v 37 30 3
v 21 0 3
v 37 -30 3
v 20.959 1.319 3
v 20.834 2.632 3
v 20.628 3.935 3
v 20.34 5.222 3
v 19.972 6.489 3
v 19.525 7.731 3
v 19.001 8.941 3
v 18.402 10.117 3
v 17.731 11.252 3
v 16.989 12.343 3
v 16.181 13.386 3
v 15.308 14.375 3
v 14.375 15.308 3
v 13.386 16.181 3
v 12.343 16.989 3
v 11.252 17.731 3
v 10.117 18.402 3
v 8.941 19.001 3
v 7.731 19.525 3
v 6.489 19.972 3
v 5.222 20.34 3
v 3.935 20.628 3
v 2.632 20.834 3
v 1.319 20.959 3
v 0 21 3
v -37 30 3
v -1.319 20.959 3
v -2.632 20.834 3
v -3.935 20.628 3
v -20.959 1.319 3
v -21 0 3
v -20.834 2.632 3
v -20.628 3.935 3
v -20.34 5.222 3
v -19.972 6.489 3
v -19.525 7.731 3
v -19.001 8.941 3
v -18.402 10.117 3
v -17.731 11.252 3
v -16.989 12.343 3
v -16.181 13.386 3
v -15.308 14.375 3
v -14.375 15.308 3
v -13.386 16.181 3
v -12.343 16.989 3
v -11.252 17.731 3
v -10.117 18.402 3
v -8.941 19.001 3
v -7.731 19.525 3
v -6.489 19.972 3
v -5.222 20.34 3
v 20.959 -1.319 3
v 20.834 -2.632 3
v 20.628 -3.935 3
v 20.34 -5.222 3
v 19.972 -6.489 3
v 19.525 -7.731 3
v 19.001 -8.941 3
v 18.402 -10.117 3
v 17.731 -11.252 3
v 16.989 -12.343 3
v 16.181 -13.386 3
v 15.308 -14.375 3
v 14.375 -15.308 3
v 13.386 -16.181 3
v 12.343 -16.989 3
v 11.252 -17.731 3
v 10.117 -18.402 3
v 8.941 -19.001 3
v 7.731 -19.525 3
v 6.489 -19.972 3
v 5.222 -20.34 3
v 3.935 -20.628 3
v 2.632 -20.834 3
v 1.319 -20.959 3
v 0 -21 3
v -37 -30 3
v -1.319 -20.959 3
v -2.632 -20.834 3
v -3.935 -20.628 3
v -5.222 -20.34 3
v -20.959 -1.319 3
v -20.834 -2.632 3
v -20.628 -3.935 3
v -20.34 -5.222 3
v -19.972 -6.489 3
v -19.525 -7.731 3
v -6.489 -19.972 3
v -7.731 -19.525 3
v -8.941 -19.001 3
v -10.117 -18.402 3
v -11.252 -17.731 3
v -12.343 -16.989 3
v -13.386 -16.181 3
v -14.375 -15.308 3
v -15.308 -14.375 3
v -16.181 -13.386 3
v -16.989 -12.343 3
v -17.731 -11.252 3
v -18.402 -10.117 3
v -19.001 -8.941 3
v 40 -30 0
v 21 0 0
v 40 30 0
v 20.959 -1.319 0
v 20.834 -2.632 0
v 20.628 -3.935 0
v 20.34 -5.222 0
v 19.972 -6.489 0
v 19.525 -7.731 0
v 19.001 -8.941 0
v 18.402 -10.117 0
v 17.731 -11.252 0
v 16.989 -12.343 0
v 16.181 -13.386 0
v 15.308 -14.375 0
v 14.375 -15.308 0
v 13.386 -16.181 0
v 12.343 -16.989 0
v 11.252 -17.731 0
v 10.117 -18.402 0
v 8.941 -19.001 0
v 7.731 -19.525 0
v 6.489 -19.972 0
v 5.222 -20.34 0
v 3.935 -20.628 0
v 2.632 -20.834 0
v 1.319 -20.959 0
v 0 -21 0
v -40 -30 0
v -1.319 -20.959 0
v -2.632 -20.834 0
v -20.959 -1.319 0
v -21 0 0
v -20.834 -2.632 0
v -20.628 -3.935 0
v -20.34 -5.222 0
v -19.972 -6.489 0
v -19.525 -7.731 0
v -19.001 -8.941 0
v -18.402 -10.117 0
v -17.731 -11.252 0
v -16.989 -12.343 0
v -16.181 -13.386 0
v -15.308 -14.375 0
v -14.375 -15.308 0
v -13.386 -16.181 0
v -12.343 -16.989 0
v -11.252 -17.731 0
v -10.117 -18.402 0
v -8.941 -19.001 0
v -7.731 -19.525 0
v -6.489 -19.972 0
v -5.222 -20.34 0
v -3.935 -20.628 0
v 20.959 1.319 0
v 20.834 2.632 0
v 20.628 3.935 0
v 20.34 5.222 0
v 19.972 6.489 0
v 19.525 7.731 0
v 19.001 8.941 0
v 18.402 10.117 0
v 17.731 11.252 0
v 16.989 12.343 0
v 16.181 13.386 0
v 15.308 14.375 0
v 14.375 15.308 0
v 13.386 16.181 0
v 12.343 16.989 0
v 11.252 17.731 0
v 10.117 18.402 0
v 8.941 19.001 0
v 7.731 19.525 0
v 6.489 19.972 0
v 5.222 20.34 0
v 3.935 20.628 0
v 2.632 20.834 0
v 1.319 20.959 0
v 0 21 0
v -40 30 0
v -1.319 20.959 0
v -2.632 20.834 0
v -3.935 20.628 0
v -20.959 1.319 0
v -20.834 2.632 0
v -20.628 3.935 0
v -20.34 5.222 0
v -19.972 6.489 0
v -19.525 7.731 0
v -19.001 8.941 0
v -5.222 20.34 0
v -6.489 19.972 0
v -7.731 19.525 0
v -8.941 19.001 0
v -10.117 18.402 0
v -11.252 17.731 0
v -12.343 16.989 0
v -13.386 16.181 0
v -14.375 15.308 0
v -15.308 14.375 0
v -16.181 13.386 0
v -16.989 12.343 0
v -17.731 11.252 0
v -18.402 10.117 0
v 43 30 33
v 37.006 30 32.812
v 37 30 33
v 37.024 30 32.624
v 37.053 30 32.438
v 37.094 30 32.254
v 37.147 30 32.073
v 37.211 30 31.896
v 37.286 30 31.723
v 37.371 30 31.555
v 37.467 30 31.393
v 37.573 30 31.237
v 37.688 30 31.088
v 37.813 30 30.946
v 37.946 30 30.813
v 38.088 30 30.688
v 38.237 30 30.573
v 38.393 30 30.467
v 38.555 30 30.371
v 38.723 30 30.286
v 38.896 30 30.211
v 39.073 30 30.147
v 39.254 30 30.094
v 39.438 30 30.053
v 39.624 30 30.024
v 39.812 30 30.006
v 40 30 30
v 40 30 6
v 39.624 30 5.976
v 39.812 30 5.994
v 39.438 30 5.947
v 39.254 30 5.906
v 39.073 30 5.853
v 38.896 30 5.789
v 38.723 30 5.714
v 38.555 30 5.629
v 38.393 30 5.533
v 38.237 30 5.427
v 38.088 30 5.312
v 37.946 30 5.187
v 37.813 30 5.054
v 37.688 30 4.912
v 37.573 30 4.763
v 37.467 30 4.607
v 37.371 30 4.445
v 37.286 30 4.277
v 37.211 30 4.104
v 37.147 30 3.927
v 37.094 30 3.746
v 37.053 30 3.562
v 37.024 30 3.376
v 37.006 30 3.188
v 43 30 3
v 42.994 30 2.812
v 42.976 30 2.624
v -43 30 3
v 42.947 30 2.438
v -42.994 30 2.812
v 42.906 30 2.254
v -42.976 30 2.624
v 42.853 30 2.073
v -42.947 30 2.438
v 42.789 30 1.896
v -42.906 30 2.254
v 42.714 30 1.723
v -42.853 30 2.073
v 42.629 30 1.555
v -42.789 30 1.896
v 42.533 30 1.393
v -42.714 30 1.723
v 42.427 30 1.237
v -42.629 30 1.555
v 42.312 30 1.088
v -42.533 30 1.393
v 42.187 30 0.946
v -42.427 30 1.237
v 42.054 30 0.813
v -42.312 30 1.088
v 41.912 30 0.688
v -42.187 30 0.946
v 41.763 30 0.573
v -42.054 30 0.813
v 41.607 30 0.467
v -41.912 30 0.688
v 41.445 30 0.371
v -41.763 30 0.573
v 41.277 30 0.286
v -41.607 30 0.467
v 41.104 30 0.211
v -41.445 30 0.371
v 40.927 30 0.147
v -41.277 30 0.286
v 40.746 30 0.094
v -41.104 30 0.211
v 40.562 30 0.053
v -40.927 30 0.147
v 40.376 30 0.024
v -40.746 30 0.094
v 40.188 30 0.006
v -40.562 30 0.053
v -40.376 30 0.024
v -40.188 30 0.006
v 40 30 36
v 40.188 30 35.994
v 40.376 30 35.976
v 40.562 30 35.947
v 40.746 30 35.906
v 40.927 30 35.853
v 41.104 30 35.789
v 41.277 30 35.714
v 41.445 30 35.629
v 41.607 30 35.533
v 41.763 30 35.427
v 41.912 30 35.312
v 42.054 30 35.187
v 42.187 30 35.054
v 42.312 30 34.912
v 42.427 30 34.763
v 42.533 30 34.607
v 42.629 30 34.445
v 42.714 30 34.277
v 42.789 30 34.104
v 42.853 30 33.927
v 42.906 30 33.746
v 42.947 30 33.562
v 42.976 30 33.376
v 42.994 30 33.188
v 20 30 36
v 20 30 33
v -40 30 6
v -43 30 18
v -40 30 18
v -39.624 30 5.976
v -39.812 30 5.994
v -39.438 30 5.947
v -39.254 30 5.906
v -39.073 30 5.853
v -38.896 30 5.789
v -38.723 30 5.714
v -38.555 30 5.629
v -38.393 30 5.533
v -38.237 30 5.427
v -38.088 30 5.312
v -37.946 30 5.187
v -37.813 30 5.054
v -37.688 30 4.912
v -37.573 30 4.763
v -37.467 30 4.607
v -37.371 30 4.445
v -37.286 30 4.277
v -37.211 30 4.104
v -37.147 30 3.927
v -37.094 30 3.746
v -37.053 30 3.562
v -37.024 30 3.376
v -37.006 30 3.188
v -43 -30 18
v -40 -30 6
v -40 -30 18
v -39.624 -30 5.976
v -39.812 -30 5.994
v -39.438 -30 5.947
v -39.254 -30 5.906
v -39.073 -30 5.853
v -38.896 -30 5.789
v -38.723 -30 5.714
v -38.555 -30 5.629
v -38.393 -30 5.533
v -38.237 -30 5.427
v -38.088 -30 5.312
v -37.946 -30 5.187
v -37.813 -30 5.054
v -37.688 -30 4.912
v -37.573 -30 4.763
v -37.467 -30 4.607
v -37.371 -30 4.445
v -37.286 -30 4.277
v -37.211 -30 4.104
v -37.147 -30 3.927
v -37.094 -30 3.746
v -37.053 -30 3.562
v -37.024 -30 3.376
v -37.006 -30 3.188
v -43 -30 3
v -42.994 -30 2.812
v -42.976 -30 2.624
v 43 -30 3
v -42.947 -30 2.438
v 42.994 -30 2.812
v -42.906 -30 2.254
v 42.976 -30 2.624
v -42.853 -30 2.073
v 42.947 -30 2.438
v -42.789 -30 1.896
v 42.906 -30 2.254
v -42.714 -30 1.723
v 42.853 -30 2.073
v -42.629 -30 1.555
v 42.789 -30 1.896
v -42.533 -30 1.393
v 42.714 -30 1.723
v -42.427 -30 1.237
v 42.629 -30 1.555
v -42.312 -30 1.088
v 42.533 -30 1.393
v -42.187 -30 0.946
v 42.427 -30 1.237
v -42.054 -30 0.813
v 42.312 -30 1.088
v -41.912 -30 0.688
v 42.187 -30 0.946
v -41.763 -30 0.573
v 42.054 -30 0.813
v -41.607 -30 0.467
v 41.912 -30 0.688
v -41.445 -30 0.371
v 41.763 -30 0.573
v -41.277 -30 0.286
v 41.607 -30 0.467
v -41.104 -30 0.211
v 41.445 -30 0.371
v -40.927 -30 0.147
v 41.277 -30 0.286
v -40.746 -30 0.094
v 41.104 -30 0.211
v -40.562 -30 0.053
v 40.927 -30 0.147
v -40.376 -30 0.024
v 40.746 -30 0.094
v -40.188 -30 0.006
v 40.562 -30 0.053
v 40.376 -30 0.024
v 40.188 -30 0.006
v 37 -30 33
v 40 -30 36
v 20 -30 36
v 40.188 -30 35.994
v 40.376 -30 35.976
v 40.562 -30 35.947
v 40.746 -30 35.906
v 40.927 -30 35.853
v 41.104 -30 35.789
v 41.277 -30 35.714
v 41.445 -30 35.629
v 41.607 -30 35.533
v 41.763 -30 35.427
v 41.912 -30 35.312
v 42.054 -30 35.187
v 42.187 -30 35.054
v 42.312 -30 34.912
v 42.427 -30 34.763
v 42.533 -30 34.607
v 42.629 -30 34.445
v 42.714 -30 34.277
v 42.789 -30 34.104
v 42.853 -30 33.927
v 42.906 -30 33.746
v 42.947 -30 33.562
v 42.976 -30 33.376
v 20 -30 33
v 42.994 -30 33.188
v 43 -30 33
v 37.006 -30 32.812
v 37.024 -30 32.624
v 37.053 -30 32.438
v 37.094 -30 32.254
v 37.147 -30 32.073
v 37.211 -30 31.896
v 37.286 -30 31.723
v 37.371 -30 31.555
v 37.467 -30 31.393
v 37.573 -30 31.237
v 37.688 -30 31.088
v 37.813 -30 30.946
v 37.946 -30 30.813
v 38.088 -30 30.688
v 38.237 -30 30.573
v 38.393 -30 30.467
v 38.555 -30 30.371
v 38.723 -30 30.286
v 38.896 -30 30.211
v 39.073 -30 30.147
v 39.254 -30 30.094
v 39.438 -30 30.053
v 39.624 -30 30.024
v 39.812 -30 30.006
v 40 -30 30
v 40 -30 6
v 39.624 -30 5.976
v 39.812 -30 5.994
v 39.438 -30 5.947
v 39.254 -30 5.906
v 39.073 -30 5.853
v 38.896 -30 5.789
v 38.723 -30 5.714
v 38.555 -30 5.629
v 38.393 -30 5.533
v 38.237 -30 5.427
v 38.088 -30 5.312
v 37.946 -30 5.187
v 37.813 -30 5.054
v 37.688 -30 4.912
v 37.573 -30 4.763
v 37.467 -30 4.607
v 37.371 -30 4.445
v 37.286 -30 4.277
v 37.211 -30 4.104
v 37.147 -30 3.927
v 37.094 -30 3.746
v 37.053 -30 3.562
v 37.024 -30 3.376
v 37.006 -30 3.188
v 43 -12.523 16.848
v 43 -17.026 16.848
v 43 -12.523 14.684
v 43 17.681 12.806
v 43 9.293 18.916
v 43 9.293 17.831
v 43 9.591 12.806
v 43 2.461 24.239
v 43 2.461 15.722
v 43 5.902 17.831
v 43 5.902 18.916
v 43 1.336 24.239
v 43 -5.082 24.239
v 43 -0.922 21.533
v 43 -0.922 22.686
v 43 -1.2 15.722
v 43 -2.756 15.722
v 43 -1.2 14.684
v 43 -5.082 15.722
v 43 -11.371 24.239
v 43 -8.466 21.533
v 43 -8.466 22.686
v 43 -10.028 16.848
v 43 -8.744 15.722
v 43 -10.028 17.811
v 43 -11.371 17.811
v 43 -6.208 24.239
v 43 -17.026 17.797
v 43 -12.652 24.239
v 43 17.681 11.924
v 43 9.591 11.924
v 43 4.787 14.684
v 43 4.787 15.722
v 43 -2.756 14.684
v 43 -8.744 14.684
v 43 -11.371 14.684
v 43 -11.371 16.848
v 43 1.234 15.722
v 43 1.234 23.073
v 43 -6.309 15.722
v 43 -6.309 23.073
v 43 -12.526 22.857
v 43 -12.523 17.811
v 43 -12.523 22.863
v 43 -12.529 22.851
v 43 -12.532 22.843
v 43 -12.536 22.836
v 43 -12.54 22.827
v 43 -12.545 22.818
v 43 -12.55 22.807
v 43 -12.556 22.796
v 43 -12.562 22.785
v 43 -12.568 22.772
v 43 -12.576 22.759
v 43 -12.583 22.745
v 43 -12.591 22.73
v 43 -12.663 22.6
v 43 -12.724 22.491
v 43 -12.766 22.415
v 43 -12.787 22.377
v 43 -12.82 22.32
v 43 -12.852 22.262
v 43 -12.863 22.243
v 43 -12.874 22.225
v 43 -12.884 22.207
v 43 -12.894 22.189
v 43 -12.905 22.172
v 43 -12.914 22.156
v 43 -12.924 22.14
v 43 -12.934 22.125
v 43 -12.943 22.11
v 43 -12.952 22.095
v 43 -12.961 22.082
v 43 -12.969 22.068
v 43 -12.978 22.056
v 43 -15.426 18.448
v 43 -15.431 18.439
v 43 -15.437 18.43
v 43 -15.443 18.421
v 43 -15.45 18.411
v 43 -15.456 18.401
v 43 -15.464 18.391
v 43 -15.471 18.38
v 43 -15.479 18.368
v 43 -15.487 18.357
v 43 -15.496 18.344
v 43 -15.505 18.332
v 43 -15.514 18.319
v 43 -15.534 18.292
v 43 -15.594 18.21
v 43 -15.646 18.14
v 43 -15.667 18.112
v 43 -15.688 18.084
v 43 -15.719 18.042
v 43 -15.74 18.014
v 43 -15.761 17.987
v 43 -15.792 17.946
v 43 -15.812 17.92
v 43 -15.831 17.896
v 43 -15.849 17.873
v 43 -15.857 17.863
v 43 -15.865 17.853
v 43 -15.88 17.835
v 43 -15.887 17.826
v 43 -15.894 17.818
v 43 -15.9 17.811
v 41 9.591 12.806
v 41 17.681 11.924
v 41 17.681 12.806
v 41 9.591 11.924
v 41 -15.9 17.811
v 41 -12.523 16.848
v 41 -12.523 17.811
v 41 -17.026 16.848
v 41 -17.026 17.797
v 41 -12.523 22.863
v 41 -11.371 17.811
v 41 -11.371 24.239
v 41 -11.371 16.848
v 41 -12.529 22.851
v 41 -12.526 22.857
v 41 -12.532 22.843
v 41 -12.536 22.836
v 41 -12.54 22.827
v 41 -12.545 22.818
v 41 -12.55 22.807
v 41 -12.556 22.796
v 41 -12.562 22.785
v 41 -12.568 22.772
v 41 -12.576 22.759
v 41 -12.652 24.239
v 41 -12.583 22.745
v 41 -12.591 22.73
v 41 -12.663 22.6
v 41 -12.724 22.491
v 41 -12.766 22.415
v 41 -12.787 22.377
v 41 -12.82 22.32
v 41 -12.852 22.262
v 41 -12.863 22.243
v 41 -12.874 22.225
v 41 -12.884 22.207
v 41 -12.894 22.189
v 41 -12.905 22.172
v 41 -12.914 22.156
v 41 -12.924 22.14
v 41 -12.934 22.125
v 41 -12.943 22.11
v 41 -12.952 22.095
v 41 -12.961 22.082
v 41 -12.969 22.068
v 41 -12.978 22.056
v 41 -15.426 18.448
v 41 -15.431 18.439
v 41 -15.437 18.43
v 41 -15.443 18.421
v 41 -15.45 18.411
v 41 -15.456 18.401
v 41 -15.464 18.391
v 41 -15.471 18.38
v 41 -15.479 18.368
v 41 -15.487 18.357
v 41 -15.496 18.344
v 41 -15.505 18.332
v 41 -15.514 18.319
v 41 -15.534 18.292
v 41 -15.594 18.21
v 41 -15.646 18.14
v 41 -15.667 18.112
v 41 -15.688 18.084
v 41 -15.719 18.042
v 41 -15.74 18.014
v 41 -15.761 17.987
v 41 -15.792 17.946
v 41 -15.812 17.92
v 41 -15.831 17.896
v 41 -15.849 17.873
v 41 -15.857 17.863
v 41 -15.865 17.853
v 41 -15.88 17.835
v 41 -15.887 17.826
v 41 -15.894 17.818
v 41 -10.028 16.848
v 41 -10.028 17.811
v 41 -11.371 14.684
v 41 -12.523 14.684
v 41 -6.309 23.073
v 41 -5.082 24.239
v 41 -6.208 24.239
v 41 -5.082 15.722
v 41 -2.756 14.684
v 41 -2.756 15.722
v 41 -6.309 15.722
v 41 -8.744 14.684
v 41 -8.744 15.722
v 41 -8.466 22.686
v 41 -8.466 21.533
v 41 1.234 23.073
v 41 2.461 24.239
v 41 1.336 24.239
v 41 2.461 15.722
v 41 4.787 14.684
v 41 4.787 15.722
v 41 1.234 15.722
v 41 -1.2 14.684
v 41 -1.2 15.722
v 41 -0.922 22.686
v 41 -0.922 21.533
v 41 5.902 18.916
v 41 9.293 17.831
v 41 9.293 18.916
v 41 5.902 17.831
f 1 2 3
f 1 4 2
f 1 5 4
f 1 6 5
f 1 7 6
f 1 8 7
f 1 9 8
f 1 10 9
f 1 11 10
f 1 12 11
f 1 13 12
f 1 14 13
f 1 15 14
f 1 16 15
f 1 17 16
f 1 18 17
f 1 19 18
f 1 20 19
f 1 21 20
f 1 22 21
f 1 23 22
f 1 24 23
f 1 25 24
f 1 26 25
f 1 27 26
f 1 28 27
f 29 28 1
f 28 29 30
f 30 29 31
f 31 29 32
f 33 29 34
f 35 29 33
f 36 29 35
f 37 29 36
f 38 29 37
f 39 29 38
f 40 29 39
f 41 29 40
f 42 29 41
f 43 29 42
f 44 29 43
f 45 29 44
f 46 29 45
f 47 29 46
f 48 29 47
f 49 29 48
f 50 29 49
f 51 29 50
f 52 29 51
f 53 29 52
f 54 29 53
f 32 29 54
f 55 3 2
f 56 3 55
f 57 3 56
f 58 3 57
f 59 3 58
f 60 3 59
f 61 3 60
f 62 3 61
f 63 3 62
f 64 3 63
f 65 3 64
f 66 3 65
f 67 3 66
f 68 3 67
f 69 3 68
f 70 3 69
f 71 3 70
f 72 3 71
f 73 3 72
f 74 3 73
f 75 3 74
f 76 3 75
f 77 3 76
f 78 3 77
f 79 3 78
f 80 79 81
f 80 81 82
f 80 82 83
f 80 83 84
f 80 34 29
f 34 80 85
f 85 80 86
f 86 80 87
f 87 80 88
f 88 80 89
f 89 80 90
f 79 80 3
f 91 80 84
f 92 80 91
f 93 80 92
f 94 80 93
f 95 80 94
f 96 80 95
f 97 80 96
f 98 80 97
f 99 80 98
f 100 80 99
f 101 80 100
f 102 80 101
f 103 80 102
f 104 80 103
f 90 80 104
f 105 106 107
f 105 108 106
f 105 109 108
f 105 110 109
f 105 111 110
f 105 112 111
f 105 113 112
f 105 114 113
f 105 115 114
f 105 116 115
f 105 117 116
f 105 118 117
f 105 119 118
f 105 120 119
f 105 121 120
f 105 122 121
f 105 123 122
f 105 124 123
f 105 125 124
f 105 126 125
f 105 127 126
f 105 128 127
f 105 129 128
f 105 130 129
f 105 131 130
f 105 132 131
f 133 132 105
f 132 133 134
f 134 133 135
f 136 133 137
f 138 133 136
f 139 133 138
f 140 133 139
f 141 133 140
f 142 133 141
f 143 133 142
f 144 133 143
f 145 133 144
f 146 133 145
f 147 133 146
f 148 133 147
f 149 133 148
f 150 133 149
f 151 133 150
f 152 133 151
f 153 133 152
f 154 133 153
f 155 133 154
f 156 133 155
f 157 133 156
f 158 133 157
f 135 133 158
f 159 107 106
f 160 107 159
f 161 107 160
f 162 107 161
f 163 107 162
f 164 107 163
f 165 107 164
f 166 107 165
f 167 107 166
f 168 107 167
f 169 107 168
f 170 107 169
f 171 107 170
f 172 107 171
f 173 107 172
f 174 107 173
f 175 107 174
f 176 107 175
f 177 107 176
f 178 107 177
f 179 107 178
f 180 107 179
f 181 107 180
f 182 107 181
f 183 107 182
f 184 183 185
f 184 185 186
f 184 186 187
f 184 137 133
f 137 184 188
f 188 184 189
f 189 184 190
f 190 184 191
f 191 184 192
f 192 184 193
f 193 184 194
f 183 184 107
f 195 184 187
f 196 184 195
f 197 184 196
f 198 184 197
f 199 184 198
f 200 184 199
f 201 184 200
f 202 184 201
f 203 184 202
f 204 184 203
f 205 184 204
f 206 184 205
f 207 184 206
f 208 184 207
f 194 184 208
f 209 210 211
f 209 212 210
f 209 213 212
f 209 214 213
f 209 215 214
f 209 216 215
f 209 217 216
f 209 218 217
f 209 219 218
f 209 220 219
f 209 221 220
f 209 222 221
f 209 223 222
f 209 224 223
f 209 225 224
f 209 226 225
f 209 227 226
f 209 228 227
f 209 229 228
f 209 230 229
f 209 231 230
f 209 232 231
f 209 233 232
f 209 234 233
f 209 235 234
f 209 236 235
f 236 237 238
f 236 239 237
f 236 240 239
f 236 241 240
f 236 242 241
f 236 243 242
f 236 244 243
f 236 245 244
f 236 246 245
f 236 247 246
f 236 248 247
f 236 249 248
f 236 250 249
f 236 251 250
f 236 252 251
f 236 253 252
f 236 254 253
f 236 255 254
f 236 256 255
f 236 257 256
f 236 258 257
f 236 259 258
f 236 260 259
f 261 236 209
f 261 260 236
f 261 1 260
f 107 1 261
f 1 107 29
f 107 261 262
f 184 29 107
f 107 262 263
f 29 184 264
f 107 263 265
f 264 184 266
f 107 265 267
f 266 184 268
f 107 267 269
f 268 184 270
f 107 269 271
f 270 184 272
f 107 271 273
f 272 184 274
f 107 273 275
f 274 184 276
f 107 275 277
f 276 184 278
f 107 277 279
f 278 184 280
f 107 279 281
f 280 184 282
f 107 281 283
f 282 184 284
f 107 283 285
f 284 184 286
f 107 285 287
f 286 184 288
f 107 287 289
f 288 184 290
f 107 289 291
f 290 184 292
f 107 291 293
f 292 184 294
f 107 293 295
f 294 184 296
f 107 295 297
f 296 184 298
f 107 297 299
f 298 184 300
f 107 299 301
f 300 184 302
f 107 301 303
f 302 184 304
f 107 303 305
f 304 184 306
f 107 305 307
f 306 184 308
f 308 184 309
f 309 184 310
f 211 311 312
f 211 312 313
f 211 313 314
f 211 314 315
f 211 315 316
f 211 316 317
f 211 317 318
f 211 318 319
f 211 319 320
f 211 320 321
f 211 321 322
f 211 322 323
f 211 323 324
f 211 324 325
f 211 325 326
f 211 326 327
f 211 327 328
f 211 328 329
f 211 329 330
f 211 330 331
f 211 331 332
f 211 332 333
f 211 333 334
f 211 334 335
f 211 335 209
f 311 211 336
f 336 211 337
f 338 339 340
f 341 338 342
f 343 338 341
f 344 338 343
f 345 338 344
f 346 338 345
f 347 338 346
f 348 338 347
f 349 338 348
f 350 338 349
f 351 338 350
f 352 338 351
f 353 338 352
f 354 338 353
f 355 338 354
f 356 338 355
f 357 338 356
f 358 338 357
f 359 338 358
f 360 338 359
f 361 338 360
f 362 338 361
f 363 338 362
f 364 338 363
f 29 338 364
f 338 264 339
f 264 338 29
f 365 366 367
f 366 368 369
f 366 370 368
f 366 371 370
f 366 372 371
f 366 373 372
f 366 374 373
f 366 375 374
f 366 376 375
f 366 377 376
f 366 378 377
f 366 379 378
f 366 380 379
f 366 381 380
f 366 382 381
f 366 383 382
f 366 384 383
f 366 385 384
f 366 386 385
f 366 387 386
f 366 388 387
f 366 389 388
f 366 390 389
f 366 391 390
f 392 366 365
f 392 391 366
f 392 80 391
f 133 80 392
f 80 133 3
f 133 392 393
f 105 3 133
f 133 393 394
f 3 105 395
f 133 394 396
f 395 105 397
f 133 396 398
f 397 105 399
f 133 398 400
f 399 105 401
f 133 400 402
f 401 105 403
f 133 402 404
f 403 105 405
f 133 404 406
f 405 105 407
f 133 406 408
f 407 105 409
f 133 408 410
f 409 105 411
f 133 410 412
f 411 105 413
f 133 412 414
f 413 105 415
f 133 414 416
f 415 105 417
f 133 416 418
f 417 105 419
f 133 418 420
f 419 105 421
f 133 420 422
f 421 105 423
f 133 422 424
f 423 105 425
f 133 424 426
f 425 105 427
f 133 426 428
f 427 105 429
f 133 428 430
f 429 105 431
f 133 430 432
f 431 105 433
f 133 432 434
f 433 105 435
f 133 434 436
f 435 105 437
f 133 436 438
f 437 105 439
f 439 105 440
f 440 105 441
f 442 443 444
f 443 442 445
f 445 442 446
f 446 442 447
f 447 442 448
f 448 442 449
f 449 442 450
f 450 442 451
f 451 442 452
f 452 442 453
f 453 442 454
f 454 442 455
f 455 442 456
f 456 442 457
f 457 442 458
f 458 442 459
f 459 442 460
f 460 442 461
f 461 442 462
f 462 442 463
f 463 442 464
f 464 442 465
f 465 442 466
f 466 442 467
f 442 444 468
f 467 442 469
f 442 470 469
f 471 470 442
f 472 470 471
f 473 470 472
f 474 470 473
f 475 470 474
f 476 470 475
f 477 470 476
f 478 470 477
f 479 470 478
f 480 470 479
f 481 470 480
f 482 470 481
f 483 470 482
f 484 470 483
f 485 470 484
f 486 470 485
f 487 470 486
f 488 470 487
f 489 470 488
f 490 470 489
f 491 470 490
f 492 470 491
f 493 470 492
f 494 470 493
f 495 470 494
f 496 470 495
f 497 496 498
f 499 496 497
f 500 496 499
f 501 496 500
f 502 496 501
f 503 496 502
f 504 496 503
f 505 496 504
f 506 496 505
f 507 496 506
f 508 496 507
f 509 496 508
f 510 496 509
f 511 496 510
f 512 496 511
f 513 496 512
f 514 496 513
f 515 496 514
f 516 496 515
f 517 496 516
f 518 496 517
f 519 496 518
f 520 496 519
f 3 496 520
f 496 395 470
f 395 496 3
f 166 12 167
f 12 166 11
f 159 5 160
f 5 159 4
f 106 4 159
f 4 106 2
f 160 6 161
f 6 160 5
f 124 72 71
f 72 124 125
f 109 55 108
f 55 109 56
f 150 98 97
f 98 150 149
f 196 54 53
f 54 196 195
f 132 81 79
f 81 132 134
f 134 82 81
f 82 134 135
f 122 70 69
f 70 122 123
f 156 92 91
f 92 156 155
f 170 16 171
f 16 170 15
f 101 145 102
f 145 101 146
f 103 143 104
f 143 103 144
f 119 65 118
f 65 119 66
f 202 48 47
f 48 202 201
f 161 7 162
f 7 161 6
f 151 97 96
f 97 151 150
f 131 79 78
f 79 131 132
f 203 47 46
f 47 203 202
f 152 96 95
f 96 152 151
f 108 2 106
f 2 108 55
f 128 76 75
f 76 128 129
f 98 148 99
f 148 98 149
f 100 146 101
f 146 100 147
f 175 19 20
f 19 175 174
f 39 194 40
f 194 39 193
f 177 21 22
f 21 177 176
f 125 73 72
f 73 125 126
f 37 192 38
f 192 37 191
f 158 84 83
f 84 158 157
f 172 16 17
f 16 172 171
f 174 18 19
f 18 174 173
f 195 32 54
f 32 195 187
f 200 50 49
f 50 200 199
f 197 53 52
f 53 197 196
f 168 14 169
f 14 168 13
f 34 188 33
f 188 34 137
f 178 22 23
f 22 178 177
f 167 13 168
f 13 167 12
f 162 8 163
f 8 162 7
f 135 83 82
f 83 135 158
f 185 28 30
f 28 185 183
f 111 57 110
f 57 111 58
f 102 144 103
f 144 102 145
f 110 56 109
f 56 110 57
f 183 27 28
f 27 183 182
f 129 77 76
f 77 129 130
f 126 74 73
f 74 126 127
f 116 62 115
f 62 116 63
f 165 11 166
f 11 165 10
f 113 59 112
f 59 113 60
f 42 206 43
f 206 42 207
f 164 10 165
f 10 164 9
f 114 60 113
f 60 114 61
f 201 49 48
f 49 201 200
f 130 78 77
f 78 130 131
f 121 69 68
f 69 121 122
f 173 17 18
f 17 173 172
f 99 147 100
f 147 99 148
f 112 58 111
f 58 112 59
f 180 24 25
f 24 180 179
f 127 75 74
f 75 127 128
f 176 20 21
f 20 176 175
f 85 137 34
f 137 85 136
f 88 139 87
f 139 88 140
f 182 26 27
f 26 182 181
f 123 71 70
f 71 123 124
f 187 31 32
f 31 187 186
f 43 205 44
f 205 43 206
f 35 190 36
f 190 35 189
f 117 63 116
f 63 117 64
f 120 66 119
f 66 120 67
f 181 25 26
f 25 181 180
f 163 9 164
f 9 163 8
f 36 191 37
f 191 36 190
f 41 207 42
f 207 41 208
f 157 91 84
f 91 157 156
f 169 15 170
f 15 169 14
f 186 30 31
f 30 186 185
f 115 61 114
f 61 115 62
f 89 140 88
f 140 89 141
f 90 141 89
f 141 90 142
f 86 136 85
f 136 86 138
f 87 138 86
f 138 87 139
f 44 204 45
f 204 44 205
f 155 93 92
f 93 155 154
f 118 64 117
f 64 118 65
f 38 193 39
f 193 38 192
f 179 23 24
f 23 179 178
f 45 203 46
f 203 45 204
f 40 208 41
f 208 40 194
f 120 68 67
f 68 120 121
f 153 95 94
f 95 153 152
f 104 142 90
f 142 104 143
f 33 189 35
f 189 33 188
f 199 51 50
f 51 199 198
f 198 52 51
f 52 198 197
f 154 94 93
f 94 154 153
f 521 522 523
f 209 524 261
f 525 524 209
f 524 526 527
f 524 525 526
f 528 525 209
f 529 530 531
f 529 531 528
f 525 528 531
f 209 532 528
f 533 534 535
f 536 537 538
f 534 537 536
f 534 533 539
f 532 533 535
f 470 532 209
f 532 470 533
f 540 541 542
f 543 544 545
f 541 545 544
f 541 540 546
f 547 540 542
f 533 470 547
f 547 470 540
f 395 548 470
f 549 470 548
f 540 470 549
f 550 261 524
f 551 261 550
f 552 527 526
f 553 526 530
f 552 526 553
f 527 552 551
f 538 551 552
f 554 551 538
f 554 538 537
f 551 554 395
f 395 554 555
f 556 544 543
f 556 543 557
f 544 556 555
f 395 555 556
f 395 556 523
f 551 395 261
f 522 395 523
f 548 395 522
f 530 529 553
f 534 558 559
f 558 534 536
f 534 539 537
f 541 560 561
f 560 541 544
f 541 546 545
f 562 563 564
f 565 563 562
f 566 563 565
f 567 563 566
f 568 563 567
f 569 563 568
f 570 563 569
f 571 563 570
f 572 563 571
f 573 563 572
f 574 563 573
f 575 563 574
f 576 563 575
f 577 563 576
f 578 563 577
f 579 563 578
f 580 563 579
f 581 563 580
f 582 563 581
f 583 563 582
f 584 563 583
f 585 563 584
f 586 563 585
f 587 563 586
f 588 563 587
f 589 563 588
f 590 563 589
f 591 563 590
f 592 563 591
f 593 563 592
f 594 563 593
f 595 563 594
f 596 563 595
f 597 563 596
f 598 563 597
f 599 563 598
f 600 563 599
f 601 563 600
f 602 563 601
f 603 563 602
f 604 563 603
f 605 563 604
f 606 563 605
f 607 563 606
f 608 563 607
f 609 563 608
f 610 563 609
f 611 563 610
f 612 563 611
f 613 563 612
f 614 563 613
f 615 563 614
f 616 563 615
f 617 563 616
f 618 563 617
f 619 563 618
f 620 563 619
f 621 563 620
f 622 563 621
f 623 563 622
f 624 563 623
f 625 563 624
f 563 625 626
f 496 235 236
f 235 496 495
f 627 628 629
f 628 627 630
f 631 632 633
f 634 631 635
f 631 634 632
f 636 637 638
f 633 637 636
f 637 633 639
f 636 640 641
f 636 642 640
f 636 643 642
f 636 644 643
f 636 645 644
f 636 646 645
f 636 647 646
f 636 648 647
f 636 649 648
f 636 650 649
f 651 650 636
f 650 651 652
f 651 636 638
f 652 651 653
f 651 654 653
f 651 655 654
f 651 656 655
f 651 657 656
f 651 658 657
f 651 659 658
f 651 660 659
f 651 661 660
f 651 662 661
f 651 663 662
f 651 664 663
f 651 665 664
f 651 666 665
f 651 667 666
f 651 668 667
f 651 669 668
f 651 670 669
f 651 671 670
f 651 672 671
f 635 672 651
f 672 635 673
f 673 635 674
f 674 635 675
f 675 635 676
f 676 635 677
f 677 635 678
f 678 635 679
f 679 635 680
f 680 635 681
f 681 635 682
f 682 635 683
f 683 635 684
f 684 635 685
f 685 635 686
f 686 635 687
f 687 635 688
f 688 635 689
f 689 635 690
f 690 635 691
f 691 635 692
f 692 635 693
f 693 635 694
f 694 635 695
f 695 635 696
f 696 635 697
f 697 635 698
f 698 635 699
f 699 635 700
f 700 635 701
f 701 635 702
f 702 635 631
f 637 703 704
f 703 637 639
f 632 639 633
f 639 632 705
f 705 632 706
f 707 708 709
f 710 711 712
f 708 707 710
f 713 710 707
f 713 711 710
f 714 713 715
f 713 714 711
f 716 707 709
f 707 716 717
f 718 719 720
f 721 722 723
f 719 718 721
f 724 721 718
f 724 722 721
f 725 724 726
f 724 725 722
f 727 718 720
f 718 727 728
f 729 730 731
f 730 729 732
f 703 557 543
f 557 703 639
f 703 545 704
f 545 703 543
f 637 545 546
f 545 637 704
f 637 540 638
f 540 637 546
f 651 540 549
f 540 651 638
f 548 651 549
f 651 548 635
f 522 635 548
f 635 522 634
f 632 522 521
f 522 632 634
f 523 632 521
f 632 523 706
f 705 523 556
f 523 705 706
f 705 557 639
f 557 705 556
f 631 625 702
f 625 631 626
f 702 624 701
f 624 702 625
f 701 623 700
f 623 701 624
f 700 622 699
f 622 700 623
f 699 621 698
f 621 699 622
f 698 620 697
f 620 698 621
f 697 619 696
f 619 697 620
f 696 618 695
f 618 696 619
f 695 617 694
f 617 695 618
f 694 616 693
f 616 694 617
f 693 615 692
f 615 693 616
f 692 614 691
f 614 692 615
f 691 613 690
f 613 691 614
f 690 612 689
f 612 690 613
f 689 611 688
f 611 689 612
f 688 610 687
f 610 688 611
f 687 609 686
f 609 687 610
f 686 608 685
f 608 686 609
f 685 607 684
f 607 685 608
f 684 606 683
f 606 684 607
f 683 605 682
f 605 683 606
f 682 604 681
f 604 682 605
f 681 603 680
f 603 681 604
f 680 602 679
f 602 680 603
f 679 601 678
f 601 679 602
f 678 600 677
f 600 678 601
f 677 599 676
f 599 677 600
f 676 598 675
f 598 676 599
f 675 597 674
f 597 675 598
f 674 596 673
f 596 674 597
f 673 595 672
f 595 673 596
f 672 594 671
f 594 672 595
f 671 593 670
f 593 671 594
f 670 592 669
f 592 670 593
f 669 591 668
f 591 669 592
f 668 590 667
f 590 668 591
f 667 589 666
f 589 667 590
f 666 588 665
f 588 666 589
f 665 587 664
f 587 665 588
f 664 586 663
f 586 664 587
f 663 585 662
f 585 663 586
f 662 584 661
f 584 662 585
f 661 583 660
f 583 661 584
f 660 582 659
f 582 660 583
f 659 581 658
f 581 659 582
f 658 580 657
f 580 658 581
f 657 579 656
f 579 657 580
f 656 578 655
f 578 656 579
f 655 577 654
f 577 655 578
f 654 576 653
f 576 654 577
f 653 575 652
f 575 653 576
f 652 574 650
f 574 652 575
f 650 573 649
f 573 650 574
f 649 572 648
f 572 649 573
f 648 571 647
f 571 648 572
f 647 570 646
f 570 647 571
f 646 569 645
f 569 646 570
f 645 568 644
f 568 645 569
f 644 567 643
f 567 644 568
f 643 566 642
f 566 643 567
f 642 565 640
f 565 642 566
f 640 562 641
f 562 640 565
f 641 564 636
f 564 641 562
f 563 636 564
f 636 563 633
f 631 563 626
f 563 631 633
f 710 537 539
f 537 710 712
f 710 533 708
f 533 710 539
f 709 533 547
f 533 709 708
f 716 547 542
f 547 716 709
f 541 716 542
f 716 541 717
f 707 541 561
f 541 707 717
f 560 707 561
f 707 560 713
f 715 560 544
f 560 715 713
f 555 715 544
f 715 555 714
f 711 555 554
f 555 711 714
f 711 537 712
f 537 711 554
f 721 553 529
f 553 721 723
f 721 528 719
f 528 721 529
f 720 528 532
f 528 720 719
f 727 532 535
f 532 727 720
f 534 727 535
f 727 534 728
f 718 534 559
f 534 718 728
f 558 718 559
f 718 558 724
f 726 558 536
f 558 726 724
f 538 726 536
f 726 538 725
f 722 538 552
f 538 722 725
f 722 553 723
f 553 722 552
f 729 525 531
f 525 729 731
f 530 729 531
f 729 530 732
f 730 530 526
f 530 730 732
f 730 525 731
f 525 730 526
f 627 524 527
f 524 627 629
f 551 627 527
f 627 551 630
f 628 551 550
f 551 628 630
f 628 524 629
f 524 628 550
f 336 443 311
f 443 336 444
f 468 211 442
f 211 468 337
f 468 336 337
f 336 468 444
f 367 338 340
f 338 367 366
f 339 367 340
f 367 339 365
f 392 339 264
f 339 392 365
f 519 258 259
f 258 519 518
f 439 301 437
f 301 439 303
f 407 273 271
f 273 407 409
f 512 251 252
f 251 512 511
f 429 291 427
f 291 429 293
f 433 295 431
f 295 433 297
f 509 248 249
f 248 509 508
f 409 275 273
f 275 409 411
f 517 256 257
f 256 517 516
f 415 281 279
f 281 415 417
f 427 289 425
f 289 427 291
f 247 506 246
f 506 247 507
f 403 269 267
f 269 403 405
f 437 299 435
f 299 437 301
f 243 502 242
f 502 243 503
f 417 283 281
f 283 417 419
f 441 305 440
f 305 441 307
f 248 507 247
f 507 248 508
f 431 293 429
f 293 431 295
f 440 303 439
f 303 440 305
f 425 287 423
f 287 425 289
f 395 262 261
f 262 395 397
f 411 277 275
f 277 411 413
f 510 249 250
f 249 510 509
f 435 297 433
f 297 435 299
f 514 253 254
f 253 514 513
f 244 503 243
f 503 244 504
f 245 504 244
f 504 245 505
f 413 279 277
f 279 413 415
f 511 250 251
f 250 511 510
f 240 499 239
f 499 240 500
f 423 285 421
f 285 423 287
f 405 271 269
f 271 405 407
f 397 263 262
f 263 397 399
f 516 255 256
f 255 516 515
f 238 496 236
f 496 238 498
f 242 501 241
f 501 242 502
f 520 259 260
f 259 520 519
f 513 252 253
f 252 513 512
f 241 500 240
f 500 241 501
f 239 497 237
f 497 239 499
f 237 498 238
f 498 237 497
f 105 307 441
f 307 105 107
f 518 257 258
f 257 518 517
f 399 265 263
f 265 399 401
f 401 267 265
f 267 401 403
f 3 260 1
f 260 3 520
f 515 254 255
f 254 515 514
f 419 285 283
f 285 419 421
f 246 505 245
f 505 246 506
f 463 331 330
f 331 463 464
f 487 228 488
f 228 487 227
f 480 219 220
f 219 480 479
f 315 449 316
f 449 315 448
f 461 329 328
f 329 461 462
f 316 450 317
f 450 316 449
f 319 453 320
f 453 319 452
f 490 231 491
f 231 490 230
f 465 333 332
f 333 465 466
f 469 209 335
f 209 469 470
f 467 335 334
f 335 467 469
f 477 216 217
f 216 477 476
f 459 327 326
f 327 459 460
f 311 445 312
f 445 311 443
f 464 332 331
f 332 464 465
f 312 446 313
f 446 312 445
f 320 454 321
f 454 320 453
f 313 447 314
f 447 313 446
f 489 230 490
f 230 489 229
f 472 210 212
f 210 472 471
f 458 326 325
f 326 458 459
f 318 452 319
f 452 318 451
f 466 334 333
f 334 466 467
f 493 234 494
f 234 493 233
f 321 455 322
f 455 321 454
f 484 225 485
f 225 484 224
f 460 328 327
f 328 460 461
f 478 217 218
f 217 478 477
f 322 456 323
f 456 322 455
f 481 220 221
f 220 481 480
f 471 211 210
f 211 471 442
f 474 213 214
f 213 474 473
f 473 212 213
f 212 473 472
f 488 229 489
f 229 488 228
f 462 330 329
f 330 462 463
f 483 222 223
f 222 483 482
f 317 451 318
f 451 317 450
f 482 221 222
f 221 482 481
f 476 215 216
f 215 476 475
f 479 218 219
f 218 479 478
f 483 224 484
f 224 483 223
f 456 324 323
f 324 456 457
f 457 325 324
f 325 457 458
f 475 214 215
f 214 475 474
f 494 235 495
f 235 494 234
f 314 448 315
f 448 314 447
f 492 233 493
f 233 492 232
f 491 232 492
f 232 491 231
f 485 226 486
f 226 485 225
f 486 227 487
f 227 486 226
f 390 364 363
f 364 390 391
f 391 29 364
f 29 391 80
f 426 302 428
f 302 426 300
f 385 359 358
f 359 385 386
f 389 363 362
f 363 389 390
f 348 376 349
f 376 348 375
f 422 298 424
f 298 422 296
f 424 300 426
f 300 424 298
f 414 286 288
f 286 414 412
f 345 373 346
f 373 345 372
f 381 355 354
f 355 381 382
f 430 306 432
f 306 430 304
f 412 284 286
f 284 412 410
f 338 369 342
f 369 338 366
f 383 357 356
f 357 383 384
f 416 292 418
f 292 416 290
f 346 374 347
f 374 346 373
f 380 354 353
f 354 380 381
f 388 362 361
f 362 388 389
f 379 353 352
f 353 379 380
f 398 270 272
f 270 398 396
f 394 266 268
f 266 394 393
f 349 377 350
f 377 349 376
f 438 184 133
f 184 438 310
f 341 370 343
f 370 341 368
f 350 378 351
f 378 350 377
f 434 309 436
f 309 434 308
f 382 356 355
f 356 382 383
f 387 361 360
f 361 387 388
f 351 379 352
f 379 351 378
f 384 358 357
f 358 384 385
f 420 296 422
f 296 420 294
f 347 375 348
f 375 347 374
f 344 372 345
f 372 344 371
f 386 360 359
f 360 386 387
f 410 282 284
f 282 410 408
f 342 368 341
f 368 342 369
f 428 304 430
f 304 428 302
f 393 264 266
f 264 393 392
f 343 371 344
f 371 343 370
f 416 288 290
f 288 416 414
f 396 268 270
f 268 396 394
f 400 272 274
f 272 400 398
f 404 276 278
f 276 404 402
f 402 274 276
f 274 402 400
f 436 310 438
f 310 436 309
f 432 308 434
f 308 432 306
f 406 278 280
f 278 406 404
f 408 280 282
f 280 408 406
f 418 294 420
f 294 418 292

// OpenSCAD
// Type 4

// DigitalThermoHygroMeter-4.scad

// First version: 2025-11-27(Thu) 08:07 JST / 2025-11-26(Wed) 23:07 UTC
// Prev update:   2025-11-28(Fri) 00:49 JST / 2025-11-27(Thu) 15:49 UTC (4x1)
// Prev update:   2025-11-29(Sat) 21:40 JST / 2025-11-29(Sat) 12:40 UTC (4x2)
// Prev update:   2025-11-30(Sun) 11:31 JST / 2025-11-30(Sun) 02:31 UTC (4x3)
// Prev update:   2025-11-30(Sun) 14:57 JST / 2025-11-30(Sun) 05:57 UTC (4x4)
// Last update:   2025-12-02(Tue) 19:42 JST / 2025-12-02(Tue) 10:42 UTC (431) // z1=60.0
// Last update:   2025-12-02(Tue) 20:44 JST / 2025-12-02(Tue) 11:44 UTC (411) // z1=30.0

$fn = 100;

x0=80.0; y0=60.0; z0=3.0; r0=21.0;
x1=z0;   y1=y0;   z1=30.0; //z1=60.0; //30.0; //20.0; //40.0;
x2=20.0; y2=y0;   z2=z0;
x3=z0;   y3=y0;   z3=15.0; //15.0; //15.0; //20.0;

tdepth = 2.0;   // 文字を掘る深さ（mm）
text="411-_";   //"431-_"; //"4x3"; //"4x2"; //"4x1";

// 穴あき板
module plate_with_hole() {
    translate([0, 0, z0/2])
        difference() {
            cube([x0, y0, z0], center=true);
            #cylinder(r=r0, h=z0 + 2, center=true);
        }
}


//module side_block1() {
//    translate([x0/2, 0, z2/2])      // x方向に x0/2 だけ平行移動
//        cube([x2, y2, z2], center=true);
//}

module side_block1() {
// side_block1：Xの大きい側の側面（Y-Z 面）に「01」を彫る

    difference() {
        // 元のブロック
        translate([x0/2 + x1/2, 0, z1/2 + z0])
            cube([x1, y1, z1], center=true);

        // 文字でくり抜く
        translate([x0/2 + x1 - tdepth, 0, z0 + z1/2]) // 側面の少し内側
            // ★ここで 90度回転を追加（X軸まわり）
            rotate([90, 0, 0])         // Y-Z 平面内で 90度回転
                rotate([0, 90, 0])     // XY -> YZ 面へ
                    #linear_extrude(height = tdepth + 0.5) // 文字の厚みを 0.5 だけ伸ばしておく
                        text(text, size   = 10, halign = "center", valign = "center");                    
    }
}


module side_block2() {
    translate([x0/2 - x2/2, 0, z0 + z1 + z2/2])
        cube([x2, y2, z2], center=true);
}

module side_block3() {
    translate([-x0/2 - x3/2, 0, z0 + z3/2])
        cube([x3, y3, z3], center=true);
}

module cylinder1() {
    #translate([x0/2, 0, z0])
        rotate([90, 0, 0])
        cylinder(h = y0, r = z0, center = true);
}

module cylinder2() {
    #translate([x0/2, 0, z0 + z1])
        rotate([90, 0, 0])
        cylinder(h = y0, r = z0, center = true);
}

module cylinder3() {
    #translate([-x0/2, 0, z0])
        rotate([90, 0, 0])
        cylinder(h = y0, r = z0, center = true);
}

// rotate([0, 90, 0])   // Y軸方向に回転
// translate([-x0/2, 0, -z0/2])          // 回転軸を設定
union() {
    plate_with_hole();
    side_block1();
    side_block2();
    side_block3();
    cylinder1();
    cylinder2();
    cylinder3();
}
